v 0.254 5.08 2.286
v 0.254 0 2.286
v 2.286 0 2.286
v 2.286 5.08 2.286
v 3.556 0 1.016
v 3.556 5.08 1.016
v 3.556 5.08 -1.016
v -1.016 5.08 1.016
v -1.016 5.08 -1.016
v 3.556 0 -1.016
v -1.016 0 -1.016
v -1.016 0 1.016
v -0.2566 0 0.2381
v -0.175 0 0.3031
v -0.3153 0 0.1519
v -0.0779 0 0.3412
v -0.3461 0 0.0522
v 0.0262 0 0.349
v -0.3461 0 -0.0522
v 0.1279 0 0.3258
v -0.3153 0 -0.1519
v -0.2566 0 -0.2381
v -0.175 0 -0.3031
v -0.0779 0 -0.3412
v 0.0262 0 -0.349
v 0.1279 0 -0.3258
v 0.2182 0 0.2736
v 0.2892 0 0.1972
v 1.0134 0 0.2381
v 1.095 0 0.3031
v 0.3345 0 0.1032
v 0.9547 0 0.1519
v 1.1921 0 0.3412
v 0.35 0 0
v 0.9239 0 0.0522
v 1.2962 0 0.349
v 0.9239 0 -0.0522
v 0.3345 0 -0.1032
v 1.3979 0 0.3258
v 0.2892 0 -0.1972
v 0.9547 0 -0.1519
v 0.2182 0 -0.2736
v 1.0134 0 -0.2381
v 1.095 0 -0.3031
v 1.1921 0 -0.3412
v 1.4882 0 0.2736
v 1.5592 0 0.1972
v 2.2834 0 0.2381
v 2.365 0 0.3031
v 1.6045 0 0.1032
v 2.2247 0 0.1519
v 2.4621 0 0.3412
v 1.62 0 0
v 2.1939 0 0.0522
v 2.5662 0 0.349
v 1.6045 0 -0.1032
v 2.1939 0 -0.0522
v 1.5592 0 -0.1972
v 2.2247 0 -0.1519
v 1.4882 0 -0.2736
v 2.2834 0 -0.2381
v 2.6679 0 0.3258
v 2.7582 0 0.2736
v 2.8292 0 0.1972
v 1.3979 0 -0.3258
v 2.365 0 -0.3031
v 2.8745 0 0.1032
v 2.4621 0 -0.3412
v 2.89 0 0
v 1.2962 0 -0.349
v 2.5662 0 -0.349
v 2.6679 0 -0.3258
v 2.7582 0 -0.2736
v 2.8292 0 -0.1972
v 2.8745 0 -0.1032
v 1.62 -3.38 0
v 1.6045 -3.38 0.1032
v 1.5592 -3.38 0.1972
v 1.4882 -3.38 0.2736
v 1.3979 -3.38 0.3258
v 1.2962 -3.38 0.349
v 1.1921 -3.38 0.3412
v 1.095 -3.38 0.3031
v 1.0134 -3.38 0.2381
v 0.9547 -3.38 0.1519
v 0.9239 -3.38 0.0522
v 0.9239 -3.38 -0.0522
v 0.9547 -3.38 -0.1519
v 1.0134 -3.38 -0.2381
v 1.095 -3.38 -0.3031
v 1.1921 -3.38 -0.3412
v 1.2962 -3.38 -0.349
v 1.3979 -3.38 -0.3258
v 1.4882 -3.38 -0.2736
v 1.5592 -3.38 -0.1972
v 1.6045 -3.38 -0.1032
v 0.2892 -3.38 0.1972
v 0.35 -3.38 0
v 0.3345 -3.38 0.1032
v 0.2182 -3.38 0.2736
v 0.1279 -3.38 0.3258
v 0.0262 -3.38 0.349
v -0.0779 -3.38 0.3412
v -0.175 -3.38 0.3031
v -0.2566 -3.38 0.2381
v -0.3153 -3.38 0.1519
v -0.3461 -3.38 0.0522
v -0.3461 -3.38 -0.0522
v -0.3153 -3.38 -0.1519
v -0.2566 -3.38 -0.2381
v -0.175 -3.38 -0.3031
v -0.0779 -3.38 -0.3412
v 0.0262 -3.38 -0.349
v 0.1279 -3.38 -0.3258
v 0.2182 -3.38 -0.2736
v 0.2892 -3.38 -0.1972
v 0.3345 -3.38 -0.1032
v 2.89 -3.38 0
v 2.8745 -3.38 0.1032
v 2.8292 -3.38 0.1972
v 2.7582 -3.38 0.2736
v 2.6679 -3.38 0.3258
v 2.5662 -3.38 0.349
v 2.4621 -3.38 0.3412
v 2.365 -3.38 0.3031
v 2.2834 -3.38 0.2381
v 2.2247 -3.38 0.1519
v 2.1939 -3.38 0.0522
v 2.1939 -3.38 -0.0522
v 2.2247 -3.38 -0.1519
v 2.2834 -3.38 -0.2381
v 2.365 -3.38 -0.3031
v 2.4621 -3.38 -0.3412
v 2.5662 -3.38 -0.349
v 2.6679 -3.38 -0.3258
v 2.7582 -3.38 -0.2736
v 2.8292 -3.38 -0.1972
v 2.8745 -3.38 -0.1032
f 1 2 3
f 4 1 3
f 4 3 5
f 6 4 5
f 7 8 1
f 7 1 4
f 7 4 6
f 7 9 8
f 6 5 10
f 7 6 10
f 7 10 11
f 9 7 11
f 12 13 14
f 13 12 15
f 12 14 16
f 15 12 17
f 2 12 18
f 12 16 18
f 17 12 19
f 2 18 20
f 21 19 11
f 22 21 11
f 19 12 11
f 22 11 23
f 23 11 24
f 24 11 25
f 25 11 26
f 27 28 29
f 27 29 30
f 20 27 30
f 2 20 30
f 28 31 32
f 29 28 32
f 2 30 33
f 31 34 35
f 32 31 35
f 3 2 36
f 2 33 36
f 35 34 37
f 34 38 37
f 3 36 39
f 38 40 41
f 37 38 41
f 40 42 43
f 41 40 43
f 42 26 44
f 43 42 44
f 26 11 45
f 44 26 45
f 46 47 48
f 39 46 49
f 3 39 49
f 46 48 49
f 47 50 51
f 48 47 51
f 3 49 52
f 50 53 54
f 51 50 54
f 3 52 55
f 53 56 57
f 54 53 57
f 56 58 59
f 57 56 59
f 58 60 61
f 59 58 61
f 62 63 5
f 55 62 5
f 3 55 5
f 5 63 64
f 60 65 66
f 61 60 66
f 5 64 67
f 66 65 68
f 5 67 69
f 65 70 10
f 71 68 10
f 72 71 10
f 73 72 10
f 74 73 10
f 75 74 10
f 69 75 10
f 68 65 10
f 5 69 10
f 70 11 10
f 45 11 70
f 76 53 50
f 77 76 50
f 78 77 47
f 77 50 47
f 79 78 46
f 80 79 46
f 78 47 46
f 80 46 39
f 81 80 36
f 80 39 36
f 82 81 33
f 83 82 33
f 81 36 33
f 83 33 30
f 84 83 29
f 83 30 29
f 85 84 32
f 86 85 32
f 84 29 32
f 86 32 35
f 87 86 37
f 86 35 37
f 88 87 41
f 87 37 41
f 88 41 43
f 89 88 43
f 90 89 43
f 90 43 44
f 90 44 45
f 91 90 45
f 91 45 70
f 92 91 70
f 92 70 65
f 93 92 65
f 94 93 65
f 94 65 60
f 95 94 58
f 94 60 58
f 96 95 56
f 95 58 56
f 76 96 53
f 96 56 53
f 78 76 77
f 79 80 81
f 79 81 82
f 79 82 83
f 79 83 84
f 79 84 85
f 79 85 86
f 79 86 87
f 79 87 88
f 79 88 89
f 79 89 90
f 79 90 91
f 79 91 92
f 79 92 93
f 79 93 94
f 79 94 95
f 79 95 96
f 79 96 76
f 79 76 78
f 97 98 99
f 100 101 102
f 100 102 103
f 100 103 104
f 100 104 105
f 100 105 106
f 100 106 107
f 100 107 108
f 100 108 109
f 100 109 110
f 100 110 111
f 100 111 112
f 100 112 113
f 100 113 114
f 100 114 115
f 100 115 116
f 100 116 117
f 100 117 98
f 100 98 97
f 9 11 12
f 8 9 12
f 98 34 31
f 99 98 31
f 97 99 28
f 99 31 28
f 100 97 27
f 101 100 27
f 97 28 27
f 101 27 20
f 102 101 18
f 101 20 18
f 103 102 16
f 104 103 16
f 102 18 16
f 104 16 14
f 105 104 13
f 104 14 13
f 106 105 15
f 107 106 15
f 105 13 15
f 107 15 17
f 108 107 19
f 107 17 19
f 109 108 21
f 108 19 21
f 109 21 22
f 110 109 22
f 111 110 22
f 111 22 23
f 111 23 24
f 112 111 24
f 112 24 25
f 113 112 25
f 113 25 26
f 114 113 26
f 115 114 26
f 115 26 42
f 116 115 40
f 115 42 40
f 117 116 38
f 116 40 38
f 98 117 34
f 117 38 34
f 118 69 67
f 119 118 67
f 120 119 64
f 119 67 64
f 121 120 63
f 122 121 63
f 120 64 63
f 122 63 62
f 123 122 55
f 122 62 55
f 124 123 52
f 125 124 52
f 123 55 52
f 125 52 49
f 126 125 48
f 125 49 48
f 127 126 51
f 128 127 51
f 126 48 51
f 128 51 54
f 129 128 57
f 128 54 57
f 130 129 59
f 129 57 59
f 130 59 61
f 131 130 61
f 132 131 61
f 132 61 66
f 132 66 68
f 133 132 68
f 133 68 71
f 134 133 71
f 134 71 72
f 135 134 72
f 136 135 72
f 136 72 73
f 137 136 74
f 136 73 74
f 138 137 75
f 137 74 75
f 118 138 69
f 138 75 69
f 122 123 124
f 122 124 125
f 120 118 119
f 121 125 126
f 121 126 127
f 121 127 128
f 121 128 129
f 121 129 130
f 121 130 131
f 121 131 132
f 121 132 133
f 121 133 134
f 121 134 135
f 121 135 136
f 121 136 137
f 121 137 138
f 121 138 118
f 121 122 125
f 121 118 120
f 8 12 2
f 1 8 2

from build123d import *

# Parameters (mm, degrees)
BOSS_EXTRUDE1_DEPTH = 5.08
SKETCH2_R           = 0.35
BOSS_EXTRUDE2_DEPTH = 3.38


with BuildPart() as part:
    # Sketch1 → Boss-Extrude1 (new body)
    with BuildSketch(Plane(origin=(0, 0, 0), x_dir=(1, 0, 0), z_dir=(0, 1, 0))):
        Polygon((-1.016, -1.016), (0.254, -2.286), (2.286, -2.286), (3.556, -1.016), (3.556, 1.016), (-1.016, 1.016), align=None)
    extrude(amount=BOSS_EXTRUDE1_DEPTH)

    # Sketch2 → Boss-Extrude2 (add)
    with BuildSketch(Plane.XZ):
        Circle(SKETCH2_R)
        with Locations((1.27, 0)):
            Circle(SKETCH2_R)
        with Locations((2.54, 0)):
            Circle(SKETCH2_R)
    extrude(amount=BOSS_EXTRUDE2_DEPTH)


solid = part.part
